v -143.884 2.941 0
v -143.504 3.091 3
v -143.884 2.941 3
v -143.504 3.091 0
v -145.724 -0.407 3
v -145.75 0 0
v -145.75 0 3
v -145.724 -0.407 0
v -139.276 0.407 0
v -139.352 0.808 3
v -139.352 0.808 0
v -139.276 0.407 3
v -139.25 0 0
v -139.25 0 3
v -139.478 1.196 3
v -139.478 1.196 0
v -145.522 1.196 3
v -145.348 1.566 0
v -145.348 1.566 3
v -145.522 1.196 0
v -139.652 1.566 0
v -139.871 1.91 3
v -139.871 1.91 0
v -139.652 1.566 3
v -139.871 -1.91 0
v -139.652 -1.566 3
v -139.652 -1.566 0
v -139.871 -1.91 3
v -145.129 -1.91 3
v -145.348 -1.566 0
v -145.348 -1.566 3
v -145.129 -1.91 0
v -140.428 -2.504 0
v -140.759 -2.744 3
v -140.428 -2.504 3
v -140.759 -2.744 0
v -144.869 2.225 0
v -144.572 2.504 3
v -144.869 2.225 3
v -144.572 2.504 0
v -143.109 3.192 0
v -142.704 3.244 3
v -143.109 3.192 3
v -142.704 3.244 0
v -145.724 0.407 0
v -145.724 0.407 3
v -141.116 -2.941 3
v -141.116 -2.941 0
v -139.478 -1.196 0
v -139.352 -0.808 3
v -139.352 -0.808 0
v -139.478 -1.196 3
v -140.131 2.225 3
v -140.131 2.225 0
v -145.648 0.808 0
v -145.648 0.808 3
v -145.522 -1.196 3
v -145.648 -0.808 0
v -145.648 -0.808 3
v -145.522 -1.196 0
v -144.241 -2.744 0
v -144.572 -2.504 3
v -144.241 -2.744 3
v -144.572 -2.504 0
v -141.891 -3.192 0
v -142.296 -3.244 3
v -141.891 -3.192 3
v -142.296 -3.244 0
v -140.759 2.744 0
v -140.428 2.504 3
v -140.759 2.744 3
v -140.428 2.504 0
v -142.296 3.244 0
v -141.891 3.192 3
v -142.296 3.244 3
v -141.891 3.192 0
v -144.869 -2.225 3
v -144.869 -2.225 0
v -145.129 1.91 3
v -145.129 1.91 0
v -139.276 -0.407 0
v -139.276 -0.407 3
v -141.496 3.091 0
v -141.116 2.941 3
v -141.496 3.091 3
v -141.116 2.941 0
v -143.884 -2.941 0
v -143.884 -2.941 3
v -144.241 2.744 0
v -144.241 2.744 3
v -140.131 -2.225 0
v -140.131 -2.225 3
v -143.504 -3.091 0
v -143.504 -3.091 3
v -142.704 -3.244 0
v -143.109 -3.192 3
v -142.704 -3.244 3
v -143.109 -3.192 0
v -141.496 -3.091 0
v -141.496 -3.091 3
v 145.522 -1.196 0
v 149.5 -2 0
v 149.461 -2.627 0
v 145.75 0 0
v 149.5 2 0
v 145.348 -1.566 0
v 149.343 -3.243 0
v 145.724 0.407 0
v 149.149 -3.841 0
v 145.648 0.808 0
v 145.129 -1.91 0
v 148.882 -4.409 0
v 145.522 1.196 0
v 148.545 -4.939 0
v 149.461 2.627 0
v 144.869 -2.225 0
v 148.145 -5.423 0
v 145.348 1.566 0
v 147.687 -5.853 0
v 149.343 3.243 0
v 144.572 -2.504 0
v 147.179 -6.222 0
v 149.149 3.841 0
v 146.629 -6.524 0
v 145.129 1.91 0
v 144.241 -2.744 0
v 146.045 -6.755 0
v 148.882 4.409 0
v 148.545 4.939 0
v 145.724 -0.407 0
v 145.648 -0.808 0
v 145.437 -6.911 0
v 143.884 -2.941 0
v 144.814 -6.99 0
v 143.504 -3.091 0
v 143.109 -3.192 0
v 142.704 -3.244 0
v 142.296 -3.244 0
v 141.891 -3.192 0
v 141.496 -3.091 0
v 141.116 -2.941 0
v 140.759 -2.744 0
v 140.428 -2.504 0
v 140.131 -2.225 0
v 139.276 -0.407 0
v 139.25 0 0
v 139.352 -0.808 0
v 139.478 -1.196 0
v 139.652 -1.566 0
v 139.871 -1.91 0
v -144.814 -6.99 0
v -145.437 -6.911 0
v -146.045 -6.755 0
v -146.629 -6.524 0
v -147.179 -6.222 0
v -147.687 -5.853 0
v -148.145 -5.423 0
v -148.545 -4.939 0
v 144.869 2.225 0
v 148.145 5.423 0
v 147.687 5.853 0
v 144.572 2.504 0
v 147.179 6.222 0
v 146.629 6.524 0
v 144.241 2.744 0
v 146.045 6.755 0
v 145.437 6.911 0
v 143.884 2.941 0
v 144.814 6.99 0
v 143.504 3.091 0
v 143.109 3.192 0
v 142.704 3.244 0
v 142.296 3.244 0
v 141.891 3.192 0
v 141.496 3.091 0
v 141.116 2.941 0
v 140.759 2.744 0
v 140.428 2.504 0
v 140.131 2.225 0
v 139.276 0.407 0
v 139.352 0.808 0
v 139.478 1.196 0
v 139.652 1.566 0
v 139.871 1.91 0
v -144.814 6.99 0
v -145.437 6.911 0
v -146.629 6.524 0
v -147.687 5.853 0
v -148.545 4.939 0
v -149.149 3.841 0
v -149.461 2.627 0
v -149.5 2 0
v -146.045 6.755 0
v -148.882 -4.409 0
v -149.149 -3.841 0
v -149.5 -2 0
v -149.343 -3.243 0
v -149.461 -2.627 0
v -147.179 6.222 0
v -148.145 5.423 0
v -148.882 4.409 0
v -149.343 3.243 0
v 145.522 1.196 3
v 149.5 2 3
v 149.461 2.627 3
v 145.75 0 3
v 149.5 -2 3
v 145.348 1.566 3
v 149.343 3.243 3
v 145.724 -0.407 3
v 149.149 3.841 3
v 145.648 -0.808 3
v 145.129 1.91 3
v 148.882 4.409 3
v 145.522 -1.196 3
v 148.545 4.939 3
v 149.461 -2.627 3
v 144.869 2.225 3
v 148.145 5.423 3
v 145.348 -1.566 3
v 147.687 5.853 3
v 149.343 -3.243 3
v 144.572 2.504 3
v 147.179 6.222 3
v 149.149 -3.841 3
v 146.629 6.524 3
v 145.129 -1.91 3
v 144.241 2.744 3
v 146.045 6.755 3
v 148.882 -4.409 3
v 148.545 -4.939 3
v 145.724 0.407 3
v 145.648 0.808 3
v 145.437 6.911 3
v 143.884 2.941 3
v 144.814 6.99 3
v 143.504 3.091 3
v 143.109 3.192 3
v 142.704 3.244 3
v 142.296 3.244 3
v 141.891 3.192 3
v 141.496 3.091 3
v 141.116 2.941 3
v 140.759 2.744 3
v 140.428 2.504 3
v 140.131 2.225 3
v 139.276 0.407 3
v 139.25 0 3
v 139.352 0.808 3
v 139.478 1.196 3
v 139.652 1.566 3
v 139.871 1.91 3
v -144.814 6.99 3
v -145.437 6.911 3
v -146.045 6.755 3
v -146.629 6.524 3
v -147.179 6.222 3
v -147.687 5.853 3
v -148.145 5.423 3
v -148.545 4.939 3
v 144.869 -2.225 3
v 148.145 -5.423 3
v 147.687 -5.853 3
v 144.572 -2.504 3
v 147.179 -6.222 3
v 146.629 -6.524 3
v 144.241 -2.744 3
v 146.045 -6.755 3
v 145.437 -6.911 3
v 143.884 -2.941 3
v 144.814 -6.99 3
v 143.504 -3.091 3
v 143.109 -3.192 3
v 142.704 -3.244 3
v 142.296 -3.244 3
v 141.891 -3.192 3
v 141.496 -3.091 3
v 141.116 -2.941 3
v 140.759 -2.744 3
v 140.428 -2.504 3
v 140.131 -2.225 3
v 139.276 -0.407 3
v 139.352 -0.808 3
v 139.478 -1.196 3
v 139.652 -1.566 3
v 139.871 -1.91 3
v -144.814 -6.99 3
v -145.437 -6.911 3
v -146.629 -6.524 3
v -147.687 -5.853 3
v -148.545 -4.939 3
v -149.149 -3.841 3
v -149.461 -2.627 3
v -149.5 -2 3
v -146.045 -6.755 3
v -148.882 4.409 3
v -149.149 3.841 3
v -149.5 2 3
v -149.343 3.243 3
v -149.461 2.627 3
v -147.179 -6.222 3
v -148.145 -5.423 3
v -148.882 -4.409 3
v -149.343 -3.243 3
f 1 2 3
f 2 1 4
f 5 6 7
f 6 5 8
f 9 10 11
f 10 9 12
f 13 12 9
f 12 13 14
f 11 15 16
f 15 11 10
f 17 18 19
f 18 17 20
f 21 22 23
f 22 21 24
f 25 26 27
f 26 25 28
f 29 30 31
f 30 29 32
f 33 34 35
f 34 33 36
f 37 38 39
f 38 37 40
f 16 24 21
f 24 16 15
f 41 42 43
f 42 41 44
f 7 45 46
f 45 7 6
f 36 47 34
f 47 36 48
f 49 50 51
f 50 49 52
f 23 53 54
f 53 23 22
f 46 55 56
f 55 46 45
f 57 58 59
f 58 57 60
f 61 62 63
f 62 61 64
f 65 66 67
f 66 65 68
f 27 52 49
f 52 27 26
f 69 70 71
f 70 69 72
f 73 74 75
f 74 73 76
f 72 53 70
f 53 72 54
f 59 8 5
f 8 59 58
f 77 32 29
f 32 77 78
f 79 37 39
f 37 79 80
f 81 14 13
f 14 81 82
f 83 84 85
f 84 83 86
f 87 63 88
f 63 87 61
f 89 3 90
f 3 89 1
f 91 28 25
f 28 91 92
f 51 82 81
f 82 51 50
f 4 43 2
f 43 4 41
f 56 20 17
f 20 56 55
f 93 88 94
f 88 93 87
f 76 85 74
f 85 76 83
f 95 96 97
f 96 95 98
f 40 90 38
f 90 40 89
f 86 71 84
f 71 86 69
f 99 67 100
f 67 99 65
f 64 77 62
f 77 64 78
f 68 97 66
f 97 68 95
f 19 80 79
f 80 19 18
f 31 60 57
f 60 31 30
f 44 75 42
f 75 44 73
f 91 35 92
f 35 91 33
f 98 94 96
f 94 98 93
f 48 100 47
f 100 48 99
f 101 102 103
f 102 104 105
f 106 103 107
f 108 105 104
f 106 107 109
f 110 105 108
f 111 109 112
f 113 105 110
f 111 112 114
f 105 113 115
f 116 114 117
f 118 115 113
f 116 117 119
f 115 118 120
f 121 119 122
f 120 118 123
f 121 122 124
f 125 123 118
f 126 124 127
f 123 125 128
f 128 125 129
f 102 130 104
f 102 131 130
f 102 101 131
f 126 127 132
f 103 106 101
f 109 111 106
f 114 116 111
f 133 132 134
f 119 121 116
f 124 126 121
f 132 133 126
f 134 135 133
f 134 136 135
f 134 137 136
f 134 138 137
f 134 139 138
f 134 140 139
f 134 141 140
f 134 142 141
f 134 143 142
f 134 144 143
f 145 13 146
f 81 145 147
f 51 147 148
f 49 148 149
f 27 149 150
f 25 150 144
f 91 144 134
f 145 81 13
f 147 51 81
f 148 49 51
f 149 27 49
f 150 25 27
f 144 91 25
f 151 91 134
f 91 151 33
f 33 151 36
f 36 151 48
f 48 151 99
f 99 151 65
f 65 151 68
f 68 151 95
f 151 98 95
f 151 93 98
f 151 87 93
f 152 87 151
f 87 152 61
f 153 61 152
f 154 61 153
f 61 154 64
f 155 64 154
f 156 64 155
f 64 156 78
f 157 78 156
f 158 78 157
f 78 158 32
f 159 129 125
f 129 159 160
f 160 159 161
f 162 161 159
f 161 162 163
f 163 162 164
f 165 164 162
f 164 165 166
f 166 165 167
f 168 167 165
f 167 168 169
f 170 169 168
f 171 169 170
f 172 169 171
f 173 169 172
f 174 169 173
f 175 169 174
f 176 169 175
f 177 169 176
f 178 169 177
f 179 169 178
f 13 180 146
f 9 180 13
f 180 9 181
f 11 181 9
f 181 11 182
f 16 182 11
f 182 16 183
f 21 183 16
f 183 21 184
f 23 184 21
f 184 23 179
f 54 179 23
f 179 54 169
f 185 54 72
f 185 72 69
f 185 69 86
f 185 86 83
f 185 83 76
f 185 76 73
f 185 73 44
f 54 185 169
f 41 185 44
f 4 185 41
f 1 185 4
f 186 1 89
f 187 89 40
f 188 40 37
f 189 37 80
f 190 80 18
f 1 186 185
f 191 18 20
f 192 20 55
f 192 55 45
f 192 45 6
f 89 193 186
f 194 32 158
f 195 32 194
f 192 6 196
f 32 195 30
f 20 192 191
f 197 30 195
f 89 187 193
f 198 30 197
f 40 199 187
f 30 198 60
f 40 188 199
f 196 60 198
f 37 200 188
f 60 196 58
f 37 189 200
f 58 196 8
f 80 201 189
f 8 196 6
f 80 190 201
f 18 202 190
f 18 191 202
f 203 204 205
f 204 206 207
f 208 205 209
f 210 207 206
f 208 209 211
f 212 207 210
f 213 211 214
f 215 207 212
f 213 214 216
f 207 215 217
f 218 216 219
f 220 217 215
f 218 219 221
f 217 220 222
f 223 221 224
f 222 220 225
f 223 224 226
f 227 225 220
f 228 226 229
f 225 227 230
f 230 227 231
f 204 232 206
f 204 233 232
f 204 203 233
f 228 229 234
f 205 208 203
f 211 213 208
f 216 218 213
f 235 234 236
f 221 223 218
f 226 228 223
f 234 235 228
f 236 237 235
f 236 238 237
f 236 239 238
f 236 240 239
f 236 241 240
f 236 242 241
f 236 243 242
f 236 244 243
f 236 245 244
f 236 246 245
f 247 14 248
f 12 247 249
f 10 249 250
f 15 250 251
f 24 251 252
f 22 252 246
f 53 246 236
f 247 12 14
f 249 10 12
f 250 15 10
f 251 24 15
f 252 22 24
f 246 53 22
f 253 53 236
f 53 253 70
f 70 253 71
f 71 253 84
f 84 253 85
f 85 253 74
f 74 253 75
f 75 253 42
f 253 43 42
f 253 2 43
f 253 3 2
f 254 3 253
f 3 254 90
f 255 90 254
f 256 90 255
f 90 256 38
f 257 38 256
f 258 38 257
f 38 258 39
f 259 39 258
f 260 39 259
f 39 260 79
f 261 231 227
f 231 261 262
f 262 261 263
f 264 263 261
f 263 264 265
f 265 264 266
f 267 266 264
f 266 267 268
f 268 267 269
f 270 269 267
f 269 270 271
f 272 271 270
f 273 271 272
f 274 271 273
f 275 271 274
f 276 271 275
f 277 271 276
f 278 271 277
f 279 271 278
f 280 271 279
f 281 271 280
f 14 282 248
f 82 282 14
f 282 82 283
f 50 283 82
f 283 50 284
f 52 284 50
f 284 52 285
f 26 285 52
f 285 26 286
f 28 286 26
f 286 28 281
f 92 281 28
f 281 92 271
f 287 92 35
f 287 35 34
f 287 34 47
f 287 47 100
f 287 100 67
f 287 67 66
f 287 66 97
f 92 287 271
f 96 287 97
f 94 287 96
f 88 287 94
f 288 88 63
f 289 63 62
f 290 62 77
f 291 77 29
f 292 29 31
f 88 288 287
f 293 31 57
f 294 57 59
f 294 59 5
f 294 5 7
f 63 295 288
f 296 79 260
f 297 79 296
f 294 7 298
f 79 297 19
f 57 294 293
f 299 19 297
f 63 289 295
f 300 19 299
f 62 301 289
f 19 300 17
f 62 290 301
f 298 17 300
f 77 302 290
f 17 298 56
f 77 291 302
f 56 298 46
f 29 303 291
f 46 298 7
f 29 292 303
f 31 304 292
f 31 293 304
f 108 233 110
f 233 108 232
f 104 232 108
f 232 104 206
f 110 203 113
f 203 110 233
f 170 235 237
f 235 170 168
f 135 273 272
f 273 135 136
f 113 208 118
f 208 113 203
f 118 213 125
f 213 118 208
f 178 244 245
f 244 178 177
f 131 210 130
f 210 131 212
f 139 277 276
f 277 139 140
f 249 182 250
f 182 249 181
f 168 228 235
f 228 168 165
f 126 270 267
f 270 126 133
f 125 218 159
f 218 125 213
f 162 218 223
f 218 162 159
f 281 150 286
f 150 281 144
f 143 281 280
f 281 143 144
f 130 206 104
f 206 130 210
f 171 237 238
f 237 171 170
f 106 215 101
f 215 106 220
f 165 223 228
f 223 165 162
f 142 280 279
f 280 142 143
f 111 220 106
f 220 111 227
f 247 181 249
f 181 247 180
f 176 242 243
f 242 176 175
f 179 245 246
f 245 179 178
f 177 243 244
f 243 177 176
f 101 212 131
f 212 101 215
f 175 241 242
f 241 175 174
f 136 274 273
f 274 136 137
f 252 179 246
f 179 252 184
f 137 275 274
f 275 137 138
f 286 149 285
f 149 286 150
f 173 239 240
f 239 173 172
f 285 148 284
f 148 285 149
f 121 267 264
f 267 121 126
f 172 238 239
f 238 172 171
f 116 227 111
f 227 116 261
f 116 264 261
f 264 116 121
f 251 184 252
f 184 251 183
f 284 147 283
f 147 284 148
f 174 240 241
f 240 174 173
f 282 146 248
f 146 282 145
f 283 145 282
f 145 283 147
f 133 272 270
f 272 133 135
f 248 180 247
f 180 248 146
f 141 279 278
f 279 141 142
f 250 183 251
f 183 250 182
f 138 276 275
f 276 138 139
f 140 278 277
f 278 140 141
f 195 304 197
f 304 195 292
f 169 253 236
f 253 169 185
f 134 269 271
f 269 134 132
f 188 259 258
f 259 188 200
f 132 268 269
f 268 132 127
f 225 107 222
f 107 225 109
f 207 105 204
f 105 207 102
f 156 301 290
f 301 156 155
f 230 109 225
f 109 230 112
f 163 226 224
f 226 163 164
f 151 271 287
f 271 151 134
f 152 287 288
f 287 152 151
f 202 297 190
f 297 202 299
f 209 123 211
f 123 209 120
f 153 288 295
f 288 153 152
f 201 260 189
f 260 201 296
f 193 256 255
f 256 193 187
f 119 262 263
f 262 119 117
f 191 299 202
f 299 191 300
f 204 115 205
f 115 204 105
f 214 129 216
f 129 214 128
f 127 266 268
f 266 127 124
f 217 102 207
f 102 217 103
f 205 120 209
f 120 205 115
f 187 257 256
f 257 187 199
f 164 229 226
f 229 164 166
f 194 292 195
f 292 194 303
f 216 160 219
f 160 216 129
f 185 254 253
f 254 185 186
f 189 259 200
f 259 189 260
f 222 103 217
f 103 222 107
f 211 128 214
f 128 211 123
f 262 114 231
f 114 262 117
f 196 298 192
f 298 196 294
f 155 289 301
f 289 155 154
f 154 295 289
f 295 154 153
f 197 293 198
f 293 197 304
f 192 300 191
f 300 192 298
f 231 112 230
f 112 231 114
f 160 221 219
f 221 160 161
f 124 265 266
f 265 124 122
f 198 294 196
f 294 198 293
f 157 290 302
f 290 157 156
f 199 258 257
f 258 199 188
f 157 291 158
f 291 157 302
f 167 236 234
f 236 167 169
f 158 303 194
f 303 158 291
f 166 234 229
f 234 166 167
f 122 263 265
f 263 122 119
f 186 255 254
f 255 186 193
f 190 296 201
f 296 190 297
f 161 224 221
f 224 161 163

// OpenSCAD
$fn = 50;


difference() {
	union() {
		hull() {
			translate(v = [-144.5000000000, 2.0000000000, 0]) {
				cylinder(h = 3, r = 5);
			}
			translate(v = [144.5000000000, 2.0000000000, 0]) {
				cylinder(h = 3, r = 5);
			}
			translate(v = [-144.5000000000, -2.0000000000, 0]) {
				cylinder(h = 3, r = 5);
			}
			translate(v = [144.5000000000, -2.0000000000, 0]) {
				cylinder(h = 3, r = 5);
			}
		}
	}
	union() {
		translate(v = [-142.5000000000, 0.0000000000, 0]) {
			cylinder(h = 3, r = 3.2500000000);
		}
		translate(v = [142.5000000000, 0.0000000000, 0]) {
			cylinder(h = 3, r = 3.2500000000);
		}
		translate(v = [-142.5000000000, 0.0000000000, 0]) {
			cylinder(h = 3, r = 1.8000000000);
		}
		translate(v = [142.5000000000, 0.0000000000, 0]) {
			cylinder(h = 3, r = 1.8000000000);
		}
		translate(v = [-142.5000000000, 0.0000000000, 0]) {
			cylinder(h = 3, r = 1.8000000000);
		}
		translate(v = [142.5000000000, 0.0000000000, 0]) {
			cylinder(h = 3, r = 1.8000000000);
		}
		translate(v = [-142.5000000000, 0.0000000000, 0]) {
			cylinder(h = 3, r = 1.8000000000);
		}
		translate(v = [142.5000000000, 0.0000000000, 0]) {
			cylinder(h = 3, r = 1.8000000000);
		}
	}
}
